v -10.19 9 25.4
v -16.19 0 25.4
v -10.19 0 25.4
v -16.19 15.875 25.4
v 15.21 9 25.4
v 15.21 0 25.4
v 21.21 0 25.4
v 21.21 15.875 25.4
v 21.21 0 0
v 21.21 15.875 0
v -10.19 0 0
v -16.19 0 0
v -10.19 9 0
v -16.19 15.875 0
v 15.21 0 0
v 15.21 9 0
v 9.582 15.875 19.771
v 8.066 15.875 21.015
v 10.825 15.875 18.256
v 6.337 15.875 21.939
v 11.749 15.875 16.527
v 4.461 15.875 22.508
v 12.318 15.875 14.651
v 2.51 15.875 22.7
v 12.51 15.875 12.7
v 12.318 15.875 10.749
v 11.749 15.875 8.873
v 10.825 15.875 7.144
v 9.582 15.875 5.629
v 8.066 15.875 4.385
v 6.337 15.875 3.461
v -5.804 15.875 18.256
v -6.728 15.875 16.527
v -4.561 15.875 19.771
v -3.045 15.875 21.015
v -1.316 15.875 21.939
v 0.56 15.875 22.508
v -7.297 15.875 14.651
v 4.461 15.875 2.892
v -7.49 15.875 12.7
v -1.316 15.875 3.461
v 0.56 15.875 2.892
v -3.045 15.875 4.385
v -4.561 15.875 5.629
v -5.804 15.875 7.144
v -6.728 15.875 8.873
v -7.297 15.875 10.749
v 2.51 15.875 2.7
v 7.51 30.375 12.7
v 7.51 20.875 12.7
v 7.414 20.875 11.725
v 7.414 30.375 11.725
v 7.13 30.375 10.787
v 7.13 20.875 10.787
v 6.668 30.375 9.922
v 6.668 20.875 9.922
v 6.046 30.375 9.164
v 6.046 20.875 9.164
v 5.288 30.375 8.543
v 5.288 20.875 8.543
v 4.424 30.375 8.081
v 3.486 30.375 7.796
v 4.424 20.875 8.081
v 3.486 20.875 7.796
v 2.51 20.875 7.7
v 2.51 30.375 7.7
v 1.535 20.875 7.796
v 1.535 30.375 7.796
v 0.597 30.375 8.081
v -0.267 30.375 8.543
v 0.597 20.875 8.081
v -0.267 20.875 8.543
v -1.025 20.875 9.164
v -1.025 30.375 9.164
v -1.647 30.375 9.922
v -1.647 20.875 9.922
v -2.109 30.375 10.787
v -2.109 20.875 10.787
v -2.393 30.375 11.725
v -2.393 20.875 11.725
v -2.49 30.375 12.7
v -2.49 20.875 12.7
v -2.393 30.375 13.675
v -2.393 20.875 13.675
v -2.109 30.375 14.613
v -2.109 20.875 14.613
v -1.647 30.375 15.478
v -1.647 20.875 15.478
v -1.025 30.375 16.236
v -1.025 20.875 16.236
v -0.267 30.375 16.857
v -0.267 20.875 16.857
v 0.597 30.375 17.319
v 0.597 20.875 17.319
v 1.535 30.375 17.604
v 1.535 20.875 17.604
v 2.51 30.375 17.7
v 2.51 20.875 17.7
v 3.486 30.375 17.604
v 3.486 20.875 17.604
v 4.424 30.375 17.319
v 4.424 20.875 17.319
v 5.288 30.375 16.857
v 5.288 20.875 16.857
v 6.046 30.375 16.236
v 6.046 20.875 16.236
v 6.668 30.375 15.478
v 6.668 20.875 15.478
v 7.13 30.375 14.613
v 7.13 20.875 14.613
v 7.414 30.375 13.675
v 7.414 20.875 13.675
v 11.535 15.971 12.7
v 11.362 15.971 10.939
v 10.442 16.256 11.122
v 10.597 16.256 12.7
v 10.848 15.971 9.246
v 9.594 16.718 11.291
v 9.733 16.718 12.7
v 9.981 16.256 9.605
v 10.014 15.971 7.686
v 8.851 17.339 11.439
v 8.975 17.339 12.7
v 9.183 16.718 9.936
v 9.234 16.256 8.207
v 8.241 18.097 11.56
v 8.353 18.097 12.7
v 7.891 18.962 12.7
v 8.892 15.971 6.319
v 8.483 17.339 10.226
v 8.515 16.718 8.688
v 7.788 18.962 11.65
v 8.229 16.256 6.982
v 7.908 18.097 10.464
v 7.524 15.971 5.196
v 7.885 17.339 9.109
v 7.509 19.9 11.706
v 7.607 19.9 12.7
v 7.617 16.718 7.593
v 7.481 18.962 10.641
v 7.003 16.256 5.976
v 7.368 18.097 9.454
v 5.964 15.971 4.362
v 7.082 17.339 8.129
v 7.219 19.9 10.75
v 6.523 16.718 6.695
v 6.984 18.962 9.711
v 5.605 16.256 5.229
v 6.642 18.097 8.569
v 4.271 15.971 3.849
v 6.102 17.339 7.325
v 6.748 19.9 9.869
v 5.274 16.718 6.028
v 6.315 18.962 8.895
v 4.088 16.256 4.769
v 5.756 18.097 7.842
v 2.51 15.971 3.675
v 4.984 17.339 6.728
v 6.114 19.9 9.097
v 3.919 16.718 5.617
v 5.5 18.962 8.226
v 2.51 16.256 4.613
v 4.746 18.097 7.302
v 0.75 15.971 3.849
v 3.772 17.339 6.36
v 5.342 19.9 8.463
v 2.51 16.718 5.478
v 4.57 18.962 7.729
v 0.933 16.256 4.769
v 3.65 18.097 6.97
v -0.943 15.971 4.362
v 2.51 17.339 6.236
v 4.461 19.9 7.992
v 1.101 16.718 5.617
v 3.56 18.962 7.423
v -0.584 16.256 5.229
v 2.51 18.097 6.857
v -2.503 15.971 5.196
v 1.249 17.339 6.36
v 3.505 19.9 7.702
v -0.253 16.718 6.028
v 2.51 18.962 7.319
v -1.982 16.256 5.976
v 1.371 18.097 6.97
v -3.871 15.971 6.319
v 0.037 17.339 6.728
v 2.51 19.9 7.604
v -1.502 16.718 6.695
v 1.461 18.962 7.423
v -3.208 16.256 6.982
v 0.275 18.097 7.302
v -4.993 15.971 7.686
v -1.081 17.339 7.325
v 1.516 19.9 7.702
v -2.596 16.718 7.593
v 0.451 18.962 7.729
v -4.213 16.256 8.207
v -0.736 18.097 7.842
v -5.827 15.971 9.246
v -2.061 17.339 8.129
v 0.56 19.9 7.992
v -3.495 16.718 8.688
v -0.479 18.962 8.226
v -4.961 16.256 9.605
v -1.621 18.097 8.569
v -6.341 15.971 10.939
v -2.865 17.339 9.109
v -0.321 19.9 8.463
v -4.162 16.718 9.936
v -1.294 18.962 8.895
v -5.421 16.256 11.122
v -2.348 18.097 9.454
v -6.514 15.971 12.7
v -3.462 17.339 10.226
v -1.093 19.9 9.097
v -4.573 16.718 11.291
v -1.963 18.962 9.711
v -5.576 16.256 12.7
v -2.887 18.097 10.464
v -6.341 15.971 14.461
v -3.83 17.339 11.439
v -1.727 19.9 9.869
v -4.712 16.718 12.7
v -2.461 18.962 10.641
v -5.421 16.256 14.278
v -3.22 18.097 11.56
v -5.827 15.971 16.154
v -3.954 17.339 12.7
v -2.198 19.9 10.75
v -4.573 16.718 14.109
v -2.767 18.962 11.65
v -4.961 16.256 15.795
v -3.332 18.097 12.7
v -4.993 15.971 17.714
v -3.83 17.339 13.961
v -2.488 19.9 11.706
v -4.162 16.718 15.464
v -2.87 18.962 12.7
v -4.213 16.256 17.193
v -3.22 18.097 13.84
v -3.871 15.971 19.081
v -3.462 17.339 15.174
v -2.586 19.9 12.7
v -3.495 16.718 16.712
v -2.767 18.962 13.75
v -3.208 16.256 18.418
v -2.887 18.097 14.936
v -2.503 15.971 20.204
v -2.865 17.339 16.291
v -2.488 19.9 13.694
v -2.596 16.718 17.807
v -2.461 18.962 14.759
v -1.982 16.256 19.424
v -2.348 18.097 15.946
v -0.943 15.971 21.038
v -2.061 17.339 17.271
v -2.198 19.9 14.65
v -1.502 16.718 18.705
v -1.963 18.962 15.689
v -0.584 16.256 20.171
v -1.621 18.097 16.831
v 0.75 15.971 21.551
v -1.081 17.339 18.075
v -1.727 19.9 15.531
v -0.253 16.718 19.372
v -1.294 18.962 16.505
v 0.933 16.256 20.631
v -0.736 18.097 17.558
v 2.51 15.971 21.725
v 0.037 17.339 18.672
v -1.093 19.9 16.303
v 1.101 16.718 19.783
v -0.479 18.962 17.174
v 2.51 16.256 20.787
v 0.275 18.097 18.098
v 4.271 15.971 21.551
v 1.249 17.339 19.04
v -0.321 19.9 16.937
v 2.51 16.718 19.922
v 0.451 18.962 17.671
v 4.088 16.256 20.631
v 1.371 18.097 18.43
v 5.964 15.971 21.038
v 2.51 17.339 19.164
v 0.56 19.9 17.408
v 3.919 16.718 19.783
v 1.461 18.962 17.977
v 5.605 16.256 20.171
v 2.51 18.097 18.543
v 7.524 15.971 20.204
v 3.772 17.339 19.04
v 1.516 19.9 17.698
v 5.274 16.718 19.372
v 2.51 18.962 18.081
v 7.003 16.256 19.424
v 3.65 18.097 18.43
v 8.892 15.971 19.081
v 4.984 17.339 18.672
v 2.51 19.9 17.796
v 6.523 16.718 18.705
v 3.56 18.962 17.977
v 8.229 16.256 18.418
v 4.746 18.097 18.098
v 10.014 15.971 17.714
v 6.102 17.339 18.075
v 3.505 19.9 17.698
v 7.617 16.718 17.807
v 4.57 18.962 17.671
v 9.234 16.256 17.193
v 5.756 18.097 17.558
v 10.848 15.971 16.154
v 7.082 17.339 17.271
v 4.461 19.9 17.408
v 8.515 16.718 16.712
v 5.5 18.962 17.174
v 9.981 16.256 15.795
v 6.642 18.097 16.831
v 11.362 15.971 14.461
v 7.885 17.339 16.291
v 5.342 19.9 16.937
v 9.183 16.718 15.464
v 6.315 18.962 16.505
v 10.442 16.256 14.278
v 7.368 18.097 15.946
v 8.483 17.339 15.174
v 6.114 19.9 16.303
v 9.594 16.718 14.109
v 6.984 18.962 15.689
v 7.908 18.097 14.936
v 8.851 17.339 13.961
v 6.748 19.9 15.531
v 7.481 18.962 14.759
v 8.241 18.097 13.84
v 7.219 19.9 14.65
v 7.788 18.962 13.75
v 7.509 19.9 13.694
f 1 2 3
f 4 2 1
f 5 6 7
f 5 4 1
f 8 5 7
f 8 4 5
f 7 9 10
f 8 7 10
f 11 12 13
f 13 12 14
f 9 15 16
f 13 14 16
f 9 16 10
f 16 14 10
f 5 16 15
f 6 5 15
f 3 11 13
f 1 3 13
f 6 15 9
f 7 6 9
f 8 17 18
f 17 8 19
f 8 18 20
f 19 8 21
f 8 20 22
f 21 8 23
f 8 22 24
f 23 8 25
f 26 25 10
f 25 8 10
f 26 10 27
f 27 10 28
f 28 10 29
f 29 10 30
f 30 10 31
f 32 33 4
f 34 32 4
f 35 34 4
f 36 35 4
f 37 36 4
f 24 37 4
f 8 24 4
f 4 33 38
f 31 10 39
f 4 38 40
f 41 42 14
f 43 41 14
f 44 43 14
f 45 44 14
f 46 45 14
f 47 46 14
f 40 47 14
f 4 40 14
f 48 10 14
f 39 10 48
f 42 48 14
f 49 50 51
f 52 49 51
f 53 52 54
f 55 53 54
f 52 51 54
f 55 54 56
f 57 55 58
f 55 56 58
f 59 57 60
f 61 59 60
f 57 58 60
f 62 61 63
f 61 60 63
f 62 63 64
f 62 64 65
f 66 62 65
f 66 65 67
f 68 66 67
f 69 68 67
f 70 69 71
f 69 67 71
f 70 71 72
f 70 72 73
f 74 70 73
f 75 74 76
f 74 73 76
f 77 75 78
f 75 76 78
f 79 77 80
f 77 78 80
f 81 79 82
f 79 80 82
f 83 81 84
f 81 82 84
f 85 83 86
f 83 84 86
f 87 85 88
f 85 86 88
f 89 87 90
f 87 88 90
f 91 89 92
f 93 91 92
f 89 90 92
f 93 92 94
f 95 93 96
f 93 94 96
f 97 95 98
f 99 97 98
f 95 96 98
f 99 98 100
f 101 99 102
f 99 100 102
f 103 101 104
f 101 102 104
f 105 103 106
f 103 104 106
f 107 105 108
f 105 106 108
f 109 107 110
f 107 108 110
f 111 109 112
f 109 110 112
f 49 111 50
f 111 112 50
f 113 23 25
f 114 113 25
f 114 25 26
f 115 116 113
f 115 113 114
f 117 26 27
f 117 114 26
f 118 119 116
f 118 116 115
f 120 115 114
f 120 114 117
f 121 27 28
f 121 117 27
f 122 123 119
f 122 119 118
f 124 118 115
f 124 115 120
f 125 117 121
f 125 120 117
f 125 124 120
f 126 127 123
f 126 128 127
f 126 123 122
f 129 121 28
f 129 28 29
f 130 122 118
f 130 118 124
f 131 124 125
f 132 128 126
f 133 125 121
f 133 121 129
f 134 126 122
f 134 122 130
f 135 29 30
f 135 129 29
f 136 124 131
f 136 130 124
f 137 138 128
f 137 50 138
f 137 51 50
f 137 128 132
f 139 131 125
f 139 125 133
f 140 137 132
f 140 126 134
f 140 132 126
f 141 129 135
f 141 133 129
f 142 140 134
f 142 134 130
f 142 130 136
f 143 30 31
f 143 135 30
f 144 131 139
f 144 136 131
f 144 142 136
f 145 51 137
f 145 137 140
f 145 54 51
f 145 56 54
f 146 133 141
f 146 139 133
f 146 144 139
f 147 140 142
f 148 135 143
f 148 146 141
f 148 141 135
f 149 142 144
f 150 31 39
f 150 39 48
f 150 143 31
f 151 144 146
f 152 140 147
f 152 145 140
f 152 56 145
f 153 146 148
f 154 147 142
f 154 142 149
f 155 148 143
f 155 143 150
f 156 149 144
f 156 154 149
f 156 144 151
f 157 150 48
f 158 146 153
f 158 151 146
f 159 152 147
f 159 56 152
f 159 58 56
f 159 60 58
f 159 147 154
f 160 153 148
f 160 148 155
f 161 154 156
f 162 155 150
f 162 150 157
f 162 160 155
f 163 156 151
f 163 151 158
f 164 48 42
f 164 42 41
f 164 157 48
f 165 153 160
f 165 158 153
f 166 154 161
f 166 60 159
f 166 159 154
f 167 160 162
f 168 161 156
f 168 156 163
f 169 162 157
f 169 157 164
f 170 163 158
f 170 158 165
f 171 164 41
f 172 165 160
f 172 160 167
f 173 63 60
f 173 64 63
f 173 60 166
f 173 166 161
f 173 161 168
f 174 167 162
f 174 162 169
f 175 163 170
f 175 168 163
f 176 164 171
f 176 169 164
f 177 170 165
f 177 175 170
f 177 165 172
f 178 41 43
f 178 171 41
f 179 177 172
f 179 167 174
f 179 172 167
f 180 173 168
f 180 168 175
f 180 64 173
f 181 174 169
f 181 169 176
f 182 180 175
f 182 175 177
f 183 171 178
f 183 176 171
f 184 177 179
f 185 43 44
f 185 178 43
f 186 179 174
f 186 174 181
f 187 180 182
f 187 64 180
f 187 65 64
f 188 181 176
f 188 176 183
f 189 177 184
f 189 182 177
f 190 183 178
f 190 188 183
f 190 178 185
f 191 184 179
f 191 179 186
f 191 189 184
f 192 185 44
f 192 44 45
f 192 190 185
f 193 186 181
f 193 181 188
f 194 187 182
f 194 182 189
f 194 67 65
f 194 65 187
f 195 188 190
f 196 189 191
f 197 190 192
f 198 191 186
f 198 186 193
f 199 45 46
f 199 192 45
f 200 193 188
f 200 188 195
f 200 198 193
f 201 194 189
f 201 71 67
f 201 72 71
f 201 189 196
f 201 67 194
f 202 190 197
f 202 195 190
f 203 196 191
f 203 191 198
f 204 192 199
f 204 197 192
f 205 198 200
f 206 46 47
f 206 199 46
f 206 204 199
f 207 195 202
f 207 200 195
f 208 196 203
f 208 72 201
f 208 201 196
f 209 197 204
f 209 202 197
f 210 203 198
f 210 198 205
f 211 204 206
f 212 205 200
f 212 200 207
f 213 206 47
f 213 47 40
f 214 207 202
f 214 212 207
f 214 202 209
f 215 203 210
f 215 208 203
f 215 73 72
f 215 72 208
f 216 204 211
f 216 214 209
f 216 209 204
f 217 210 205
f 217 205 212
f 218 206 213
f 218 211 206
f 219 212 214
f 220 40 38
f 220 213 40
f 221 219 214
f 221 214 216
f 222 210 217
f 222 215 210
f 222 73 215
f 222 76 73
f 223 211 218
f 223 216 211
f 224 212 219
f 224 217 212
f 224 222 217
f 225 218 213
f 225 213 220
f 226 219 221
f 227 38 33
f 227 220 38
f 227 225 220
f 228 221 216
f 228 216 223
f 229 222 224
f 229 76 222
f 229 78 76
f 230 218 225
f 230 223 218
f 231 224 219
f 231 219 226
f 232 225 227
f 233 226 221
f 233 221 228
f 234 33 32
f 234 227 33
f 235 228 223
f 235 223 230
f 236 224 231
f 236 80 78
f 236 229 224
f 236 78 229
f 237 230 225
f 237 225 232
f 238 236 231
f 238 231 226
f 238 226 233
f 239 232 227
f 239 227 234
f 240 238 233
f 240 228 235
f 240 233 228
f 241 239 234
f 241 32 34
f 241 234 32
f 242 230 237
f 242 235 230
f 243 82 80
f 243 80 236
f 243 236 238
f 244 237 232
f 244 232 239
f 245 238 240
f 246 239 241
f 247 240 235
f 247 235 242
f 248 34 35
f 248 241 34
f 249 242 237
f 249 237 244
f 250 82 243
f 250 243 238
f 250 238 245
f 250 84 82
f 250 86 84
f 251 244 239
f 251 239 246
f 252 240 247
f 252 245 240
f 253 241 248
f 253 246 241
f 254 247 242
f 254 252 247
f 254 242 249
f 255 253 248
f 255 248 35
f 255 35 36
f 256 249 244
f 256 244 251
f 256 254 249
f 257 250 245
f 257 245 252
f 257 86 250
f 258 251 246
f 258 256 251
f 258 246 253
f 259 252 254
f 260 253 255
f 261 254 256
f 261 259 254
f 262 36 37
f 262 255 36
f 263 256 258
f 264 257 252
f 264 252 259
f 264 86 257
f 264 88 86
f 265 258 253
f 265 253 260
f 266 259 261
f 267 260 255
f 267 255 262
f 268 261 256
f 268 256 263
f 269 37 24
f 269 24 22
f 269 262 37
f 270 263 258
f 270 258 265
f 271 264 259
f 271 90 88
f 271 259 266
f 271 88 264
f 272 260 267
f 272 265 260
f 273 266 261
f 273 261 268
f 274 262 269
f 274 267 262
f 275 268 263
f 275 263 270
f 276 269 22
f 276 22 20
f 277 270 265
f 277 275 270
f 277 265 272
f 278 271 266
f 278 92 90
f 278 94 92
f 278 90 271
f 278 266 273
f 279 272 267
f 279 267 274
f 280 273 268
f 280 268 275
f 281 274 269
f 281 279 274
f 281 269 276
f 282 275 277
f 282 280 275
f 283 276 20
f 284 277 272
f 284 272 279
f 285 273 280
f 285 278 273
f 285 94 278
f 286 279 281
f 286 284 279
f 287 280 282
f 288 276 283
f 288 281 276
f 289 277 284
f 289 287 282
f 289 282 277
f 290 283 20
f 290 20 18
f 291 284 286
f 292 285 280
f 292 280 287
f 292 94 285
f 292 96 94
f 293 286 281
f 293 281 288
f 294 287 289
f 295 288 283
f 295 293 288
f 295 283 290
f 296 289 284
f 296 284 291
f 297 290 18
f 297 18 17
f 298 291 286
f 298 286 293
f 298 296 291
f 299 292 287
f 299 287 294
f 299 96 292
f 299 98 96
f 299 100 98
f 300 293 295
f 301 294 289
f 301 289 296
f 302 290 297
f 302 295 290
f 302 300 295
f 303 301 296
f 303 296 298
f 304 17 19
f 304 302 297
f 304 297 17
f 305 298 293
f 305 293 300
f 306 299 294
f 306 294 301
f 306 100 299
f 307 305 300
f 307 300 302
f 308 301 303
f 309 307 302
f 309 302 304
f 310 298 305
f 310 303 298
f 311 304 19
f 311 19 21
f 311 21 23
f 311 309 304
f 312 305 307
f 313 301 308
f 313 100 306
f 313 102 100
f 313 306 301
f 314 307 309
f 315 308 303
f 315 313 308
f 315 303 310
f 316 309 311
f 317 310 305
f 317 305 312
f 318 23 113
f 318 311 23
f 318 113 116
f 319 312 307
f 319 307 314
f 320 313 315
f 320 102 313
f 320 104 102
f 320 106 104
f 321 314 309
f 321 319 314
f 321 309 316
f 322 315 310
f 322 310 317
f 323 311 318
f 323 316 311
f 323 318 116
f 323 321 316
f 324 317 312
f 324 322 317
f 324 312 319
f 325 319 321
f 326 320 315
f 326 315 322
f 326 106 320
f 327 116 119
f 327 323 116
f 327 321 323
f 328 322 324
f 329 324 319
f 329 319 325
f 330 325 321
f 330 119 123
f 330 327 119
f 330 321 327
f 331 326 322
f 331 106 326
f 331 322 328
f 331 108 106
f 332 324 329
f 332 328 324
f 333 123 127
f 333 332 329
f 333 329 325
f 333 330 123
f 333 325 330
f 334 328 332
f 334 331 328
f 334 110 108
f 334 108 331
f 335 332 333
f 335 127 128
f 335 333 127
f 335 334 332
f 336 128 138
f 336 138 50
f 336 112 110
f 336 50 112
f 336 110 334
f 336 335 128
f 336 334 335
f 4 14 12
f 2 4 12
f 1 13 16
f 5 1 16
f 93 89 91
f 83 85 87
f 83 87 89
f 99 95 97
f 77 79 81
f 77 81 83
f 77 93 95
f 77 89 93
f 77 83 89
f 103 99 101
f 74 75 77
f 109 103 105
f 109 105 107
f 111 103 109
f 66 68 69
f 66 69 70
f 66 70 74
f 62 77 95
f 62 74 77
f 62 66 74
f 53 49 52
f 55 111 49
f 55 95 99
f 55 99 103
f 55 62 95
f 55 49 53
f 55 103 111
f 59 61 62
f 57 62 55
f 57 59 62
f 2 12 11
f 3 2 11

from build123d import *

# Parameters (mm, degrees)
BOSS_EXTRUDE1_DEPTH = 25.4
SKETCH2_R           = 5
BOSS_EXTRUDE2_DEPTH = 14.5
FILLET1_R           = 5


with BuildPart() as part:
    # Sketch1 → Boss-Extrude1 (new body)
    with BuildSketch(Plane.XY):
        Polygon((-10.189534884, 0), (-10.189534884, 9), (15.210465116, 9), (15.210465116, 0), (21.210465116, 0), (21.210465116, 15.875), (-16.189534884, 15.875), (-16.189534884, 0), align=None)
    extrude(amount=BOSS_EXTRUDE1_DEPTH)

    # Sketch2 → Boss-Extrude2 (add)
    with BuildSketch(Plane(origin=(0, 15.875, 0), x_dir=(1, 0, 0), z_dir=(0, 1, 0))):
        with Locations((2.510465116, -12.7)):
            Circle(SKETCH2_R)
    extrude(amount=BOSS_EXTRUDE2_DEPTH)

    # Fillet1
    fillet1_edges = [part.edges().sort_by_distance(p)[0] for p in [
        (-2.489534884, 15.875, 12.7),
    ]]
    fillet(fillet1_edges, radius=FILLET1_R)


solid = part.part
